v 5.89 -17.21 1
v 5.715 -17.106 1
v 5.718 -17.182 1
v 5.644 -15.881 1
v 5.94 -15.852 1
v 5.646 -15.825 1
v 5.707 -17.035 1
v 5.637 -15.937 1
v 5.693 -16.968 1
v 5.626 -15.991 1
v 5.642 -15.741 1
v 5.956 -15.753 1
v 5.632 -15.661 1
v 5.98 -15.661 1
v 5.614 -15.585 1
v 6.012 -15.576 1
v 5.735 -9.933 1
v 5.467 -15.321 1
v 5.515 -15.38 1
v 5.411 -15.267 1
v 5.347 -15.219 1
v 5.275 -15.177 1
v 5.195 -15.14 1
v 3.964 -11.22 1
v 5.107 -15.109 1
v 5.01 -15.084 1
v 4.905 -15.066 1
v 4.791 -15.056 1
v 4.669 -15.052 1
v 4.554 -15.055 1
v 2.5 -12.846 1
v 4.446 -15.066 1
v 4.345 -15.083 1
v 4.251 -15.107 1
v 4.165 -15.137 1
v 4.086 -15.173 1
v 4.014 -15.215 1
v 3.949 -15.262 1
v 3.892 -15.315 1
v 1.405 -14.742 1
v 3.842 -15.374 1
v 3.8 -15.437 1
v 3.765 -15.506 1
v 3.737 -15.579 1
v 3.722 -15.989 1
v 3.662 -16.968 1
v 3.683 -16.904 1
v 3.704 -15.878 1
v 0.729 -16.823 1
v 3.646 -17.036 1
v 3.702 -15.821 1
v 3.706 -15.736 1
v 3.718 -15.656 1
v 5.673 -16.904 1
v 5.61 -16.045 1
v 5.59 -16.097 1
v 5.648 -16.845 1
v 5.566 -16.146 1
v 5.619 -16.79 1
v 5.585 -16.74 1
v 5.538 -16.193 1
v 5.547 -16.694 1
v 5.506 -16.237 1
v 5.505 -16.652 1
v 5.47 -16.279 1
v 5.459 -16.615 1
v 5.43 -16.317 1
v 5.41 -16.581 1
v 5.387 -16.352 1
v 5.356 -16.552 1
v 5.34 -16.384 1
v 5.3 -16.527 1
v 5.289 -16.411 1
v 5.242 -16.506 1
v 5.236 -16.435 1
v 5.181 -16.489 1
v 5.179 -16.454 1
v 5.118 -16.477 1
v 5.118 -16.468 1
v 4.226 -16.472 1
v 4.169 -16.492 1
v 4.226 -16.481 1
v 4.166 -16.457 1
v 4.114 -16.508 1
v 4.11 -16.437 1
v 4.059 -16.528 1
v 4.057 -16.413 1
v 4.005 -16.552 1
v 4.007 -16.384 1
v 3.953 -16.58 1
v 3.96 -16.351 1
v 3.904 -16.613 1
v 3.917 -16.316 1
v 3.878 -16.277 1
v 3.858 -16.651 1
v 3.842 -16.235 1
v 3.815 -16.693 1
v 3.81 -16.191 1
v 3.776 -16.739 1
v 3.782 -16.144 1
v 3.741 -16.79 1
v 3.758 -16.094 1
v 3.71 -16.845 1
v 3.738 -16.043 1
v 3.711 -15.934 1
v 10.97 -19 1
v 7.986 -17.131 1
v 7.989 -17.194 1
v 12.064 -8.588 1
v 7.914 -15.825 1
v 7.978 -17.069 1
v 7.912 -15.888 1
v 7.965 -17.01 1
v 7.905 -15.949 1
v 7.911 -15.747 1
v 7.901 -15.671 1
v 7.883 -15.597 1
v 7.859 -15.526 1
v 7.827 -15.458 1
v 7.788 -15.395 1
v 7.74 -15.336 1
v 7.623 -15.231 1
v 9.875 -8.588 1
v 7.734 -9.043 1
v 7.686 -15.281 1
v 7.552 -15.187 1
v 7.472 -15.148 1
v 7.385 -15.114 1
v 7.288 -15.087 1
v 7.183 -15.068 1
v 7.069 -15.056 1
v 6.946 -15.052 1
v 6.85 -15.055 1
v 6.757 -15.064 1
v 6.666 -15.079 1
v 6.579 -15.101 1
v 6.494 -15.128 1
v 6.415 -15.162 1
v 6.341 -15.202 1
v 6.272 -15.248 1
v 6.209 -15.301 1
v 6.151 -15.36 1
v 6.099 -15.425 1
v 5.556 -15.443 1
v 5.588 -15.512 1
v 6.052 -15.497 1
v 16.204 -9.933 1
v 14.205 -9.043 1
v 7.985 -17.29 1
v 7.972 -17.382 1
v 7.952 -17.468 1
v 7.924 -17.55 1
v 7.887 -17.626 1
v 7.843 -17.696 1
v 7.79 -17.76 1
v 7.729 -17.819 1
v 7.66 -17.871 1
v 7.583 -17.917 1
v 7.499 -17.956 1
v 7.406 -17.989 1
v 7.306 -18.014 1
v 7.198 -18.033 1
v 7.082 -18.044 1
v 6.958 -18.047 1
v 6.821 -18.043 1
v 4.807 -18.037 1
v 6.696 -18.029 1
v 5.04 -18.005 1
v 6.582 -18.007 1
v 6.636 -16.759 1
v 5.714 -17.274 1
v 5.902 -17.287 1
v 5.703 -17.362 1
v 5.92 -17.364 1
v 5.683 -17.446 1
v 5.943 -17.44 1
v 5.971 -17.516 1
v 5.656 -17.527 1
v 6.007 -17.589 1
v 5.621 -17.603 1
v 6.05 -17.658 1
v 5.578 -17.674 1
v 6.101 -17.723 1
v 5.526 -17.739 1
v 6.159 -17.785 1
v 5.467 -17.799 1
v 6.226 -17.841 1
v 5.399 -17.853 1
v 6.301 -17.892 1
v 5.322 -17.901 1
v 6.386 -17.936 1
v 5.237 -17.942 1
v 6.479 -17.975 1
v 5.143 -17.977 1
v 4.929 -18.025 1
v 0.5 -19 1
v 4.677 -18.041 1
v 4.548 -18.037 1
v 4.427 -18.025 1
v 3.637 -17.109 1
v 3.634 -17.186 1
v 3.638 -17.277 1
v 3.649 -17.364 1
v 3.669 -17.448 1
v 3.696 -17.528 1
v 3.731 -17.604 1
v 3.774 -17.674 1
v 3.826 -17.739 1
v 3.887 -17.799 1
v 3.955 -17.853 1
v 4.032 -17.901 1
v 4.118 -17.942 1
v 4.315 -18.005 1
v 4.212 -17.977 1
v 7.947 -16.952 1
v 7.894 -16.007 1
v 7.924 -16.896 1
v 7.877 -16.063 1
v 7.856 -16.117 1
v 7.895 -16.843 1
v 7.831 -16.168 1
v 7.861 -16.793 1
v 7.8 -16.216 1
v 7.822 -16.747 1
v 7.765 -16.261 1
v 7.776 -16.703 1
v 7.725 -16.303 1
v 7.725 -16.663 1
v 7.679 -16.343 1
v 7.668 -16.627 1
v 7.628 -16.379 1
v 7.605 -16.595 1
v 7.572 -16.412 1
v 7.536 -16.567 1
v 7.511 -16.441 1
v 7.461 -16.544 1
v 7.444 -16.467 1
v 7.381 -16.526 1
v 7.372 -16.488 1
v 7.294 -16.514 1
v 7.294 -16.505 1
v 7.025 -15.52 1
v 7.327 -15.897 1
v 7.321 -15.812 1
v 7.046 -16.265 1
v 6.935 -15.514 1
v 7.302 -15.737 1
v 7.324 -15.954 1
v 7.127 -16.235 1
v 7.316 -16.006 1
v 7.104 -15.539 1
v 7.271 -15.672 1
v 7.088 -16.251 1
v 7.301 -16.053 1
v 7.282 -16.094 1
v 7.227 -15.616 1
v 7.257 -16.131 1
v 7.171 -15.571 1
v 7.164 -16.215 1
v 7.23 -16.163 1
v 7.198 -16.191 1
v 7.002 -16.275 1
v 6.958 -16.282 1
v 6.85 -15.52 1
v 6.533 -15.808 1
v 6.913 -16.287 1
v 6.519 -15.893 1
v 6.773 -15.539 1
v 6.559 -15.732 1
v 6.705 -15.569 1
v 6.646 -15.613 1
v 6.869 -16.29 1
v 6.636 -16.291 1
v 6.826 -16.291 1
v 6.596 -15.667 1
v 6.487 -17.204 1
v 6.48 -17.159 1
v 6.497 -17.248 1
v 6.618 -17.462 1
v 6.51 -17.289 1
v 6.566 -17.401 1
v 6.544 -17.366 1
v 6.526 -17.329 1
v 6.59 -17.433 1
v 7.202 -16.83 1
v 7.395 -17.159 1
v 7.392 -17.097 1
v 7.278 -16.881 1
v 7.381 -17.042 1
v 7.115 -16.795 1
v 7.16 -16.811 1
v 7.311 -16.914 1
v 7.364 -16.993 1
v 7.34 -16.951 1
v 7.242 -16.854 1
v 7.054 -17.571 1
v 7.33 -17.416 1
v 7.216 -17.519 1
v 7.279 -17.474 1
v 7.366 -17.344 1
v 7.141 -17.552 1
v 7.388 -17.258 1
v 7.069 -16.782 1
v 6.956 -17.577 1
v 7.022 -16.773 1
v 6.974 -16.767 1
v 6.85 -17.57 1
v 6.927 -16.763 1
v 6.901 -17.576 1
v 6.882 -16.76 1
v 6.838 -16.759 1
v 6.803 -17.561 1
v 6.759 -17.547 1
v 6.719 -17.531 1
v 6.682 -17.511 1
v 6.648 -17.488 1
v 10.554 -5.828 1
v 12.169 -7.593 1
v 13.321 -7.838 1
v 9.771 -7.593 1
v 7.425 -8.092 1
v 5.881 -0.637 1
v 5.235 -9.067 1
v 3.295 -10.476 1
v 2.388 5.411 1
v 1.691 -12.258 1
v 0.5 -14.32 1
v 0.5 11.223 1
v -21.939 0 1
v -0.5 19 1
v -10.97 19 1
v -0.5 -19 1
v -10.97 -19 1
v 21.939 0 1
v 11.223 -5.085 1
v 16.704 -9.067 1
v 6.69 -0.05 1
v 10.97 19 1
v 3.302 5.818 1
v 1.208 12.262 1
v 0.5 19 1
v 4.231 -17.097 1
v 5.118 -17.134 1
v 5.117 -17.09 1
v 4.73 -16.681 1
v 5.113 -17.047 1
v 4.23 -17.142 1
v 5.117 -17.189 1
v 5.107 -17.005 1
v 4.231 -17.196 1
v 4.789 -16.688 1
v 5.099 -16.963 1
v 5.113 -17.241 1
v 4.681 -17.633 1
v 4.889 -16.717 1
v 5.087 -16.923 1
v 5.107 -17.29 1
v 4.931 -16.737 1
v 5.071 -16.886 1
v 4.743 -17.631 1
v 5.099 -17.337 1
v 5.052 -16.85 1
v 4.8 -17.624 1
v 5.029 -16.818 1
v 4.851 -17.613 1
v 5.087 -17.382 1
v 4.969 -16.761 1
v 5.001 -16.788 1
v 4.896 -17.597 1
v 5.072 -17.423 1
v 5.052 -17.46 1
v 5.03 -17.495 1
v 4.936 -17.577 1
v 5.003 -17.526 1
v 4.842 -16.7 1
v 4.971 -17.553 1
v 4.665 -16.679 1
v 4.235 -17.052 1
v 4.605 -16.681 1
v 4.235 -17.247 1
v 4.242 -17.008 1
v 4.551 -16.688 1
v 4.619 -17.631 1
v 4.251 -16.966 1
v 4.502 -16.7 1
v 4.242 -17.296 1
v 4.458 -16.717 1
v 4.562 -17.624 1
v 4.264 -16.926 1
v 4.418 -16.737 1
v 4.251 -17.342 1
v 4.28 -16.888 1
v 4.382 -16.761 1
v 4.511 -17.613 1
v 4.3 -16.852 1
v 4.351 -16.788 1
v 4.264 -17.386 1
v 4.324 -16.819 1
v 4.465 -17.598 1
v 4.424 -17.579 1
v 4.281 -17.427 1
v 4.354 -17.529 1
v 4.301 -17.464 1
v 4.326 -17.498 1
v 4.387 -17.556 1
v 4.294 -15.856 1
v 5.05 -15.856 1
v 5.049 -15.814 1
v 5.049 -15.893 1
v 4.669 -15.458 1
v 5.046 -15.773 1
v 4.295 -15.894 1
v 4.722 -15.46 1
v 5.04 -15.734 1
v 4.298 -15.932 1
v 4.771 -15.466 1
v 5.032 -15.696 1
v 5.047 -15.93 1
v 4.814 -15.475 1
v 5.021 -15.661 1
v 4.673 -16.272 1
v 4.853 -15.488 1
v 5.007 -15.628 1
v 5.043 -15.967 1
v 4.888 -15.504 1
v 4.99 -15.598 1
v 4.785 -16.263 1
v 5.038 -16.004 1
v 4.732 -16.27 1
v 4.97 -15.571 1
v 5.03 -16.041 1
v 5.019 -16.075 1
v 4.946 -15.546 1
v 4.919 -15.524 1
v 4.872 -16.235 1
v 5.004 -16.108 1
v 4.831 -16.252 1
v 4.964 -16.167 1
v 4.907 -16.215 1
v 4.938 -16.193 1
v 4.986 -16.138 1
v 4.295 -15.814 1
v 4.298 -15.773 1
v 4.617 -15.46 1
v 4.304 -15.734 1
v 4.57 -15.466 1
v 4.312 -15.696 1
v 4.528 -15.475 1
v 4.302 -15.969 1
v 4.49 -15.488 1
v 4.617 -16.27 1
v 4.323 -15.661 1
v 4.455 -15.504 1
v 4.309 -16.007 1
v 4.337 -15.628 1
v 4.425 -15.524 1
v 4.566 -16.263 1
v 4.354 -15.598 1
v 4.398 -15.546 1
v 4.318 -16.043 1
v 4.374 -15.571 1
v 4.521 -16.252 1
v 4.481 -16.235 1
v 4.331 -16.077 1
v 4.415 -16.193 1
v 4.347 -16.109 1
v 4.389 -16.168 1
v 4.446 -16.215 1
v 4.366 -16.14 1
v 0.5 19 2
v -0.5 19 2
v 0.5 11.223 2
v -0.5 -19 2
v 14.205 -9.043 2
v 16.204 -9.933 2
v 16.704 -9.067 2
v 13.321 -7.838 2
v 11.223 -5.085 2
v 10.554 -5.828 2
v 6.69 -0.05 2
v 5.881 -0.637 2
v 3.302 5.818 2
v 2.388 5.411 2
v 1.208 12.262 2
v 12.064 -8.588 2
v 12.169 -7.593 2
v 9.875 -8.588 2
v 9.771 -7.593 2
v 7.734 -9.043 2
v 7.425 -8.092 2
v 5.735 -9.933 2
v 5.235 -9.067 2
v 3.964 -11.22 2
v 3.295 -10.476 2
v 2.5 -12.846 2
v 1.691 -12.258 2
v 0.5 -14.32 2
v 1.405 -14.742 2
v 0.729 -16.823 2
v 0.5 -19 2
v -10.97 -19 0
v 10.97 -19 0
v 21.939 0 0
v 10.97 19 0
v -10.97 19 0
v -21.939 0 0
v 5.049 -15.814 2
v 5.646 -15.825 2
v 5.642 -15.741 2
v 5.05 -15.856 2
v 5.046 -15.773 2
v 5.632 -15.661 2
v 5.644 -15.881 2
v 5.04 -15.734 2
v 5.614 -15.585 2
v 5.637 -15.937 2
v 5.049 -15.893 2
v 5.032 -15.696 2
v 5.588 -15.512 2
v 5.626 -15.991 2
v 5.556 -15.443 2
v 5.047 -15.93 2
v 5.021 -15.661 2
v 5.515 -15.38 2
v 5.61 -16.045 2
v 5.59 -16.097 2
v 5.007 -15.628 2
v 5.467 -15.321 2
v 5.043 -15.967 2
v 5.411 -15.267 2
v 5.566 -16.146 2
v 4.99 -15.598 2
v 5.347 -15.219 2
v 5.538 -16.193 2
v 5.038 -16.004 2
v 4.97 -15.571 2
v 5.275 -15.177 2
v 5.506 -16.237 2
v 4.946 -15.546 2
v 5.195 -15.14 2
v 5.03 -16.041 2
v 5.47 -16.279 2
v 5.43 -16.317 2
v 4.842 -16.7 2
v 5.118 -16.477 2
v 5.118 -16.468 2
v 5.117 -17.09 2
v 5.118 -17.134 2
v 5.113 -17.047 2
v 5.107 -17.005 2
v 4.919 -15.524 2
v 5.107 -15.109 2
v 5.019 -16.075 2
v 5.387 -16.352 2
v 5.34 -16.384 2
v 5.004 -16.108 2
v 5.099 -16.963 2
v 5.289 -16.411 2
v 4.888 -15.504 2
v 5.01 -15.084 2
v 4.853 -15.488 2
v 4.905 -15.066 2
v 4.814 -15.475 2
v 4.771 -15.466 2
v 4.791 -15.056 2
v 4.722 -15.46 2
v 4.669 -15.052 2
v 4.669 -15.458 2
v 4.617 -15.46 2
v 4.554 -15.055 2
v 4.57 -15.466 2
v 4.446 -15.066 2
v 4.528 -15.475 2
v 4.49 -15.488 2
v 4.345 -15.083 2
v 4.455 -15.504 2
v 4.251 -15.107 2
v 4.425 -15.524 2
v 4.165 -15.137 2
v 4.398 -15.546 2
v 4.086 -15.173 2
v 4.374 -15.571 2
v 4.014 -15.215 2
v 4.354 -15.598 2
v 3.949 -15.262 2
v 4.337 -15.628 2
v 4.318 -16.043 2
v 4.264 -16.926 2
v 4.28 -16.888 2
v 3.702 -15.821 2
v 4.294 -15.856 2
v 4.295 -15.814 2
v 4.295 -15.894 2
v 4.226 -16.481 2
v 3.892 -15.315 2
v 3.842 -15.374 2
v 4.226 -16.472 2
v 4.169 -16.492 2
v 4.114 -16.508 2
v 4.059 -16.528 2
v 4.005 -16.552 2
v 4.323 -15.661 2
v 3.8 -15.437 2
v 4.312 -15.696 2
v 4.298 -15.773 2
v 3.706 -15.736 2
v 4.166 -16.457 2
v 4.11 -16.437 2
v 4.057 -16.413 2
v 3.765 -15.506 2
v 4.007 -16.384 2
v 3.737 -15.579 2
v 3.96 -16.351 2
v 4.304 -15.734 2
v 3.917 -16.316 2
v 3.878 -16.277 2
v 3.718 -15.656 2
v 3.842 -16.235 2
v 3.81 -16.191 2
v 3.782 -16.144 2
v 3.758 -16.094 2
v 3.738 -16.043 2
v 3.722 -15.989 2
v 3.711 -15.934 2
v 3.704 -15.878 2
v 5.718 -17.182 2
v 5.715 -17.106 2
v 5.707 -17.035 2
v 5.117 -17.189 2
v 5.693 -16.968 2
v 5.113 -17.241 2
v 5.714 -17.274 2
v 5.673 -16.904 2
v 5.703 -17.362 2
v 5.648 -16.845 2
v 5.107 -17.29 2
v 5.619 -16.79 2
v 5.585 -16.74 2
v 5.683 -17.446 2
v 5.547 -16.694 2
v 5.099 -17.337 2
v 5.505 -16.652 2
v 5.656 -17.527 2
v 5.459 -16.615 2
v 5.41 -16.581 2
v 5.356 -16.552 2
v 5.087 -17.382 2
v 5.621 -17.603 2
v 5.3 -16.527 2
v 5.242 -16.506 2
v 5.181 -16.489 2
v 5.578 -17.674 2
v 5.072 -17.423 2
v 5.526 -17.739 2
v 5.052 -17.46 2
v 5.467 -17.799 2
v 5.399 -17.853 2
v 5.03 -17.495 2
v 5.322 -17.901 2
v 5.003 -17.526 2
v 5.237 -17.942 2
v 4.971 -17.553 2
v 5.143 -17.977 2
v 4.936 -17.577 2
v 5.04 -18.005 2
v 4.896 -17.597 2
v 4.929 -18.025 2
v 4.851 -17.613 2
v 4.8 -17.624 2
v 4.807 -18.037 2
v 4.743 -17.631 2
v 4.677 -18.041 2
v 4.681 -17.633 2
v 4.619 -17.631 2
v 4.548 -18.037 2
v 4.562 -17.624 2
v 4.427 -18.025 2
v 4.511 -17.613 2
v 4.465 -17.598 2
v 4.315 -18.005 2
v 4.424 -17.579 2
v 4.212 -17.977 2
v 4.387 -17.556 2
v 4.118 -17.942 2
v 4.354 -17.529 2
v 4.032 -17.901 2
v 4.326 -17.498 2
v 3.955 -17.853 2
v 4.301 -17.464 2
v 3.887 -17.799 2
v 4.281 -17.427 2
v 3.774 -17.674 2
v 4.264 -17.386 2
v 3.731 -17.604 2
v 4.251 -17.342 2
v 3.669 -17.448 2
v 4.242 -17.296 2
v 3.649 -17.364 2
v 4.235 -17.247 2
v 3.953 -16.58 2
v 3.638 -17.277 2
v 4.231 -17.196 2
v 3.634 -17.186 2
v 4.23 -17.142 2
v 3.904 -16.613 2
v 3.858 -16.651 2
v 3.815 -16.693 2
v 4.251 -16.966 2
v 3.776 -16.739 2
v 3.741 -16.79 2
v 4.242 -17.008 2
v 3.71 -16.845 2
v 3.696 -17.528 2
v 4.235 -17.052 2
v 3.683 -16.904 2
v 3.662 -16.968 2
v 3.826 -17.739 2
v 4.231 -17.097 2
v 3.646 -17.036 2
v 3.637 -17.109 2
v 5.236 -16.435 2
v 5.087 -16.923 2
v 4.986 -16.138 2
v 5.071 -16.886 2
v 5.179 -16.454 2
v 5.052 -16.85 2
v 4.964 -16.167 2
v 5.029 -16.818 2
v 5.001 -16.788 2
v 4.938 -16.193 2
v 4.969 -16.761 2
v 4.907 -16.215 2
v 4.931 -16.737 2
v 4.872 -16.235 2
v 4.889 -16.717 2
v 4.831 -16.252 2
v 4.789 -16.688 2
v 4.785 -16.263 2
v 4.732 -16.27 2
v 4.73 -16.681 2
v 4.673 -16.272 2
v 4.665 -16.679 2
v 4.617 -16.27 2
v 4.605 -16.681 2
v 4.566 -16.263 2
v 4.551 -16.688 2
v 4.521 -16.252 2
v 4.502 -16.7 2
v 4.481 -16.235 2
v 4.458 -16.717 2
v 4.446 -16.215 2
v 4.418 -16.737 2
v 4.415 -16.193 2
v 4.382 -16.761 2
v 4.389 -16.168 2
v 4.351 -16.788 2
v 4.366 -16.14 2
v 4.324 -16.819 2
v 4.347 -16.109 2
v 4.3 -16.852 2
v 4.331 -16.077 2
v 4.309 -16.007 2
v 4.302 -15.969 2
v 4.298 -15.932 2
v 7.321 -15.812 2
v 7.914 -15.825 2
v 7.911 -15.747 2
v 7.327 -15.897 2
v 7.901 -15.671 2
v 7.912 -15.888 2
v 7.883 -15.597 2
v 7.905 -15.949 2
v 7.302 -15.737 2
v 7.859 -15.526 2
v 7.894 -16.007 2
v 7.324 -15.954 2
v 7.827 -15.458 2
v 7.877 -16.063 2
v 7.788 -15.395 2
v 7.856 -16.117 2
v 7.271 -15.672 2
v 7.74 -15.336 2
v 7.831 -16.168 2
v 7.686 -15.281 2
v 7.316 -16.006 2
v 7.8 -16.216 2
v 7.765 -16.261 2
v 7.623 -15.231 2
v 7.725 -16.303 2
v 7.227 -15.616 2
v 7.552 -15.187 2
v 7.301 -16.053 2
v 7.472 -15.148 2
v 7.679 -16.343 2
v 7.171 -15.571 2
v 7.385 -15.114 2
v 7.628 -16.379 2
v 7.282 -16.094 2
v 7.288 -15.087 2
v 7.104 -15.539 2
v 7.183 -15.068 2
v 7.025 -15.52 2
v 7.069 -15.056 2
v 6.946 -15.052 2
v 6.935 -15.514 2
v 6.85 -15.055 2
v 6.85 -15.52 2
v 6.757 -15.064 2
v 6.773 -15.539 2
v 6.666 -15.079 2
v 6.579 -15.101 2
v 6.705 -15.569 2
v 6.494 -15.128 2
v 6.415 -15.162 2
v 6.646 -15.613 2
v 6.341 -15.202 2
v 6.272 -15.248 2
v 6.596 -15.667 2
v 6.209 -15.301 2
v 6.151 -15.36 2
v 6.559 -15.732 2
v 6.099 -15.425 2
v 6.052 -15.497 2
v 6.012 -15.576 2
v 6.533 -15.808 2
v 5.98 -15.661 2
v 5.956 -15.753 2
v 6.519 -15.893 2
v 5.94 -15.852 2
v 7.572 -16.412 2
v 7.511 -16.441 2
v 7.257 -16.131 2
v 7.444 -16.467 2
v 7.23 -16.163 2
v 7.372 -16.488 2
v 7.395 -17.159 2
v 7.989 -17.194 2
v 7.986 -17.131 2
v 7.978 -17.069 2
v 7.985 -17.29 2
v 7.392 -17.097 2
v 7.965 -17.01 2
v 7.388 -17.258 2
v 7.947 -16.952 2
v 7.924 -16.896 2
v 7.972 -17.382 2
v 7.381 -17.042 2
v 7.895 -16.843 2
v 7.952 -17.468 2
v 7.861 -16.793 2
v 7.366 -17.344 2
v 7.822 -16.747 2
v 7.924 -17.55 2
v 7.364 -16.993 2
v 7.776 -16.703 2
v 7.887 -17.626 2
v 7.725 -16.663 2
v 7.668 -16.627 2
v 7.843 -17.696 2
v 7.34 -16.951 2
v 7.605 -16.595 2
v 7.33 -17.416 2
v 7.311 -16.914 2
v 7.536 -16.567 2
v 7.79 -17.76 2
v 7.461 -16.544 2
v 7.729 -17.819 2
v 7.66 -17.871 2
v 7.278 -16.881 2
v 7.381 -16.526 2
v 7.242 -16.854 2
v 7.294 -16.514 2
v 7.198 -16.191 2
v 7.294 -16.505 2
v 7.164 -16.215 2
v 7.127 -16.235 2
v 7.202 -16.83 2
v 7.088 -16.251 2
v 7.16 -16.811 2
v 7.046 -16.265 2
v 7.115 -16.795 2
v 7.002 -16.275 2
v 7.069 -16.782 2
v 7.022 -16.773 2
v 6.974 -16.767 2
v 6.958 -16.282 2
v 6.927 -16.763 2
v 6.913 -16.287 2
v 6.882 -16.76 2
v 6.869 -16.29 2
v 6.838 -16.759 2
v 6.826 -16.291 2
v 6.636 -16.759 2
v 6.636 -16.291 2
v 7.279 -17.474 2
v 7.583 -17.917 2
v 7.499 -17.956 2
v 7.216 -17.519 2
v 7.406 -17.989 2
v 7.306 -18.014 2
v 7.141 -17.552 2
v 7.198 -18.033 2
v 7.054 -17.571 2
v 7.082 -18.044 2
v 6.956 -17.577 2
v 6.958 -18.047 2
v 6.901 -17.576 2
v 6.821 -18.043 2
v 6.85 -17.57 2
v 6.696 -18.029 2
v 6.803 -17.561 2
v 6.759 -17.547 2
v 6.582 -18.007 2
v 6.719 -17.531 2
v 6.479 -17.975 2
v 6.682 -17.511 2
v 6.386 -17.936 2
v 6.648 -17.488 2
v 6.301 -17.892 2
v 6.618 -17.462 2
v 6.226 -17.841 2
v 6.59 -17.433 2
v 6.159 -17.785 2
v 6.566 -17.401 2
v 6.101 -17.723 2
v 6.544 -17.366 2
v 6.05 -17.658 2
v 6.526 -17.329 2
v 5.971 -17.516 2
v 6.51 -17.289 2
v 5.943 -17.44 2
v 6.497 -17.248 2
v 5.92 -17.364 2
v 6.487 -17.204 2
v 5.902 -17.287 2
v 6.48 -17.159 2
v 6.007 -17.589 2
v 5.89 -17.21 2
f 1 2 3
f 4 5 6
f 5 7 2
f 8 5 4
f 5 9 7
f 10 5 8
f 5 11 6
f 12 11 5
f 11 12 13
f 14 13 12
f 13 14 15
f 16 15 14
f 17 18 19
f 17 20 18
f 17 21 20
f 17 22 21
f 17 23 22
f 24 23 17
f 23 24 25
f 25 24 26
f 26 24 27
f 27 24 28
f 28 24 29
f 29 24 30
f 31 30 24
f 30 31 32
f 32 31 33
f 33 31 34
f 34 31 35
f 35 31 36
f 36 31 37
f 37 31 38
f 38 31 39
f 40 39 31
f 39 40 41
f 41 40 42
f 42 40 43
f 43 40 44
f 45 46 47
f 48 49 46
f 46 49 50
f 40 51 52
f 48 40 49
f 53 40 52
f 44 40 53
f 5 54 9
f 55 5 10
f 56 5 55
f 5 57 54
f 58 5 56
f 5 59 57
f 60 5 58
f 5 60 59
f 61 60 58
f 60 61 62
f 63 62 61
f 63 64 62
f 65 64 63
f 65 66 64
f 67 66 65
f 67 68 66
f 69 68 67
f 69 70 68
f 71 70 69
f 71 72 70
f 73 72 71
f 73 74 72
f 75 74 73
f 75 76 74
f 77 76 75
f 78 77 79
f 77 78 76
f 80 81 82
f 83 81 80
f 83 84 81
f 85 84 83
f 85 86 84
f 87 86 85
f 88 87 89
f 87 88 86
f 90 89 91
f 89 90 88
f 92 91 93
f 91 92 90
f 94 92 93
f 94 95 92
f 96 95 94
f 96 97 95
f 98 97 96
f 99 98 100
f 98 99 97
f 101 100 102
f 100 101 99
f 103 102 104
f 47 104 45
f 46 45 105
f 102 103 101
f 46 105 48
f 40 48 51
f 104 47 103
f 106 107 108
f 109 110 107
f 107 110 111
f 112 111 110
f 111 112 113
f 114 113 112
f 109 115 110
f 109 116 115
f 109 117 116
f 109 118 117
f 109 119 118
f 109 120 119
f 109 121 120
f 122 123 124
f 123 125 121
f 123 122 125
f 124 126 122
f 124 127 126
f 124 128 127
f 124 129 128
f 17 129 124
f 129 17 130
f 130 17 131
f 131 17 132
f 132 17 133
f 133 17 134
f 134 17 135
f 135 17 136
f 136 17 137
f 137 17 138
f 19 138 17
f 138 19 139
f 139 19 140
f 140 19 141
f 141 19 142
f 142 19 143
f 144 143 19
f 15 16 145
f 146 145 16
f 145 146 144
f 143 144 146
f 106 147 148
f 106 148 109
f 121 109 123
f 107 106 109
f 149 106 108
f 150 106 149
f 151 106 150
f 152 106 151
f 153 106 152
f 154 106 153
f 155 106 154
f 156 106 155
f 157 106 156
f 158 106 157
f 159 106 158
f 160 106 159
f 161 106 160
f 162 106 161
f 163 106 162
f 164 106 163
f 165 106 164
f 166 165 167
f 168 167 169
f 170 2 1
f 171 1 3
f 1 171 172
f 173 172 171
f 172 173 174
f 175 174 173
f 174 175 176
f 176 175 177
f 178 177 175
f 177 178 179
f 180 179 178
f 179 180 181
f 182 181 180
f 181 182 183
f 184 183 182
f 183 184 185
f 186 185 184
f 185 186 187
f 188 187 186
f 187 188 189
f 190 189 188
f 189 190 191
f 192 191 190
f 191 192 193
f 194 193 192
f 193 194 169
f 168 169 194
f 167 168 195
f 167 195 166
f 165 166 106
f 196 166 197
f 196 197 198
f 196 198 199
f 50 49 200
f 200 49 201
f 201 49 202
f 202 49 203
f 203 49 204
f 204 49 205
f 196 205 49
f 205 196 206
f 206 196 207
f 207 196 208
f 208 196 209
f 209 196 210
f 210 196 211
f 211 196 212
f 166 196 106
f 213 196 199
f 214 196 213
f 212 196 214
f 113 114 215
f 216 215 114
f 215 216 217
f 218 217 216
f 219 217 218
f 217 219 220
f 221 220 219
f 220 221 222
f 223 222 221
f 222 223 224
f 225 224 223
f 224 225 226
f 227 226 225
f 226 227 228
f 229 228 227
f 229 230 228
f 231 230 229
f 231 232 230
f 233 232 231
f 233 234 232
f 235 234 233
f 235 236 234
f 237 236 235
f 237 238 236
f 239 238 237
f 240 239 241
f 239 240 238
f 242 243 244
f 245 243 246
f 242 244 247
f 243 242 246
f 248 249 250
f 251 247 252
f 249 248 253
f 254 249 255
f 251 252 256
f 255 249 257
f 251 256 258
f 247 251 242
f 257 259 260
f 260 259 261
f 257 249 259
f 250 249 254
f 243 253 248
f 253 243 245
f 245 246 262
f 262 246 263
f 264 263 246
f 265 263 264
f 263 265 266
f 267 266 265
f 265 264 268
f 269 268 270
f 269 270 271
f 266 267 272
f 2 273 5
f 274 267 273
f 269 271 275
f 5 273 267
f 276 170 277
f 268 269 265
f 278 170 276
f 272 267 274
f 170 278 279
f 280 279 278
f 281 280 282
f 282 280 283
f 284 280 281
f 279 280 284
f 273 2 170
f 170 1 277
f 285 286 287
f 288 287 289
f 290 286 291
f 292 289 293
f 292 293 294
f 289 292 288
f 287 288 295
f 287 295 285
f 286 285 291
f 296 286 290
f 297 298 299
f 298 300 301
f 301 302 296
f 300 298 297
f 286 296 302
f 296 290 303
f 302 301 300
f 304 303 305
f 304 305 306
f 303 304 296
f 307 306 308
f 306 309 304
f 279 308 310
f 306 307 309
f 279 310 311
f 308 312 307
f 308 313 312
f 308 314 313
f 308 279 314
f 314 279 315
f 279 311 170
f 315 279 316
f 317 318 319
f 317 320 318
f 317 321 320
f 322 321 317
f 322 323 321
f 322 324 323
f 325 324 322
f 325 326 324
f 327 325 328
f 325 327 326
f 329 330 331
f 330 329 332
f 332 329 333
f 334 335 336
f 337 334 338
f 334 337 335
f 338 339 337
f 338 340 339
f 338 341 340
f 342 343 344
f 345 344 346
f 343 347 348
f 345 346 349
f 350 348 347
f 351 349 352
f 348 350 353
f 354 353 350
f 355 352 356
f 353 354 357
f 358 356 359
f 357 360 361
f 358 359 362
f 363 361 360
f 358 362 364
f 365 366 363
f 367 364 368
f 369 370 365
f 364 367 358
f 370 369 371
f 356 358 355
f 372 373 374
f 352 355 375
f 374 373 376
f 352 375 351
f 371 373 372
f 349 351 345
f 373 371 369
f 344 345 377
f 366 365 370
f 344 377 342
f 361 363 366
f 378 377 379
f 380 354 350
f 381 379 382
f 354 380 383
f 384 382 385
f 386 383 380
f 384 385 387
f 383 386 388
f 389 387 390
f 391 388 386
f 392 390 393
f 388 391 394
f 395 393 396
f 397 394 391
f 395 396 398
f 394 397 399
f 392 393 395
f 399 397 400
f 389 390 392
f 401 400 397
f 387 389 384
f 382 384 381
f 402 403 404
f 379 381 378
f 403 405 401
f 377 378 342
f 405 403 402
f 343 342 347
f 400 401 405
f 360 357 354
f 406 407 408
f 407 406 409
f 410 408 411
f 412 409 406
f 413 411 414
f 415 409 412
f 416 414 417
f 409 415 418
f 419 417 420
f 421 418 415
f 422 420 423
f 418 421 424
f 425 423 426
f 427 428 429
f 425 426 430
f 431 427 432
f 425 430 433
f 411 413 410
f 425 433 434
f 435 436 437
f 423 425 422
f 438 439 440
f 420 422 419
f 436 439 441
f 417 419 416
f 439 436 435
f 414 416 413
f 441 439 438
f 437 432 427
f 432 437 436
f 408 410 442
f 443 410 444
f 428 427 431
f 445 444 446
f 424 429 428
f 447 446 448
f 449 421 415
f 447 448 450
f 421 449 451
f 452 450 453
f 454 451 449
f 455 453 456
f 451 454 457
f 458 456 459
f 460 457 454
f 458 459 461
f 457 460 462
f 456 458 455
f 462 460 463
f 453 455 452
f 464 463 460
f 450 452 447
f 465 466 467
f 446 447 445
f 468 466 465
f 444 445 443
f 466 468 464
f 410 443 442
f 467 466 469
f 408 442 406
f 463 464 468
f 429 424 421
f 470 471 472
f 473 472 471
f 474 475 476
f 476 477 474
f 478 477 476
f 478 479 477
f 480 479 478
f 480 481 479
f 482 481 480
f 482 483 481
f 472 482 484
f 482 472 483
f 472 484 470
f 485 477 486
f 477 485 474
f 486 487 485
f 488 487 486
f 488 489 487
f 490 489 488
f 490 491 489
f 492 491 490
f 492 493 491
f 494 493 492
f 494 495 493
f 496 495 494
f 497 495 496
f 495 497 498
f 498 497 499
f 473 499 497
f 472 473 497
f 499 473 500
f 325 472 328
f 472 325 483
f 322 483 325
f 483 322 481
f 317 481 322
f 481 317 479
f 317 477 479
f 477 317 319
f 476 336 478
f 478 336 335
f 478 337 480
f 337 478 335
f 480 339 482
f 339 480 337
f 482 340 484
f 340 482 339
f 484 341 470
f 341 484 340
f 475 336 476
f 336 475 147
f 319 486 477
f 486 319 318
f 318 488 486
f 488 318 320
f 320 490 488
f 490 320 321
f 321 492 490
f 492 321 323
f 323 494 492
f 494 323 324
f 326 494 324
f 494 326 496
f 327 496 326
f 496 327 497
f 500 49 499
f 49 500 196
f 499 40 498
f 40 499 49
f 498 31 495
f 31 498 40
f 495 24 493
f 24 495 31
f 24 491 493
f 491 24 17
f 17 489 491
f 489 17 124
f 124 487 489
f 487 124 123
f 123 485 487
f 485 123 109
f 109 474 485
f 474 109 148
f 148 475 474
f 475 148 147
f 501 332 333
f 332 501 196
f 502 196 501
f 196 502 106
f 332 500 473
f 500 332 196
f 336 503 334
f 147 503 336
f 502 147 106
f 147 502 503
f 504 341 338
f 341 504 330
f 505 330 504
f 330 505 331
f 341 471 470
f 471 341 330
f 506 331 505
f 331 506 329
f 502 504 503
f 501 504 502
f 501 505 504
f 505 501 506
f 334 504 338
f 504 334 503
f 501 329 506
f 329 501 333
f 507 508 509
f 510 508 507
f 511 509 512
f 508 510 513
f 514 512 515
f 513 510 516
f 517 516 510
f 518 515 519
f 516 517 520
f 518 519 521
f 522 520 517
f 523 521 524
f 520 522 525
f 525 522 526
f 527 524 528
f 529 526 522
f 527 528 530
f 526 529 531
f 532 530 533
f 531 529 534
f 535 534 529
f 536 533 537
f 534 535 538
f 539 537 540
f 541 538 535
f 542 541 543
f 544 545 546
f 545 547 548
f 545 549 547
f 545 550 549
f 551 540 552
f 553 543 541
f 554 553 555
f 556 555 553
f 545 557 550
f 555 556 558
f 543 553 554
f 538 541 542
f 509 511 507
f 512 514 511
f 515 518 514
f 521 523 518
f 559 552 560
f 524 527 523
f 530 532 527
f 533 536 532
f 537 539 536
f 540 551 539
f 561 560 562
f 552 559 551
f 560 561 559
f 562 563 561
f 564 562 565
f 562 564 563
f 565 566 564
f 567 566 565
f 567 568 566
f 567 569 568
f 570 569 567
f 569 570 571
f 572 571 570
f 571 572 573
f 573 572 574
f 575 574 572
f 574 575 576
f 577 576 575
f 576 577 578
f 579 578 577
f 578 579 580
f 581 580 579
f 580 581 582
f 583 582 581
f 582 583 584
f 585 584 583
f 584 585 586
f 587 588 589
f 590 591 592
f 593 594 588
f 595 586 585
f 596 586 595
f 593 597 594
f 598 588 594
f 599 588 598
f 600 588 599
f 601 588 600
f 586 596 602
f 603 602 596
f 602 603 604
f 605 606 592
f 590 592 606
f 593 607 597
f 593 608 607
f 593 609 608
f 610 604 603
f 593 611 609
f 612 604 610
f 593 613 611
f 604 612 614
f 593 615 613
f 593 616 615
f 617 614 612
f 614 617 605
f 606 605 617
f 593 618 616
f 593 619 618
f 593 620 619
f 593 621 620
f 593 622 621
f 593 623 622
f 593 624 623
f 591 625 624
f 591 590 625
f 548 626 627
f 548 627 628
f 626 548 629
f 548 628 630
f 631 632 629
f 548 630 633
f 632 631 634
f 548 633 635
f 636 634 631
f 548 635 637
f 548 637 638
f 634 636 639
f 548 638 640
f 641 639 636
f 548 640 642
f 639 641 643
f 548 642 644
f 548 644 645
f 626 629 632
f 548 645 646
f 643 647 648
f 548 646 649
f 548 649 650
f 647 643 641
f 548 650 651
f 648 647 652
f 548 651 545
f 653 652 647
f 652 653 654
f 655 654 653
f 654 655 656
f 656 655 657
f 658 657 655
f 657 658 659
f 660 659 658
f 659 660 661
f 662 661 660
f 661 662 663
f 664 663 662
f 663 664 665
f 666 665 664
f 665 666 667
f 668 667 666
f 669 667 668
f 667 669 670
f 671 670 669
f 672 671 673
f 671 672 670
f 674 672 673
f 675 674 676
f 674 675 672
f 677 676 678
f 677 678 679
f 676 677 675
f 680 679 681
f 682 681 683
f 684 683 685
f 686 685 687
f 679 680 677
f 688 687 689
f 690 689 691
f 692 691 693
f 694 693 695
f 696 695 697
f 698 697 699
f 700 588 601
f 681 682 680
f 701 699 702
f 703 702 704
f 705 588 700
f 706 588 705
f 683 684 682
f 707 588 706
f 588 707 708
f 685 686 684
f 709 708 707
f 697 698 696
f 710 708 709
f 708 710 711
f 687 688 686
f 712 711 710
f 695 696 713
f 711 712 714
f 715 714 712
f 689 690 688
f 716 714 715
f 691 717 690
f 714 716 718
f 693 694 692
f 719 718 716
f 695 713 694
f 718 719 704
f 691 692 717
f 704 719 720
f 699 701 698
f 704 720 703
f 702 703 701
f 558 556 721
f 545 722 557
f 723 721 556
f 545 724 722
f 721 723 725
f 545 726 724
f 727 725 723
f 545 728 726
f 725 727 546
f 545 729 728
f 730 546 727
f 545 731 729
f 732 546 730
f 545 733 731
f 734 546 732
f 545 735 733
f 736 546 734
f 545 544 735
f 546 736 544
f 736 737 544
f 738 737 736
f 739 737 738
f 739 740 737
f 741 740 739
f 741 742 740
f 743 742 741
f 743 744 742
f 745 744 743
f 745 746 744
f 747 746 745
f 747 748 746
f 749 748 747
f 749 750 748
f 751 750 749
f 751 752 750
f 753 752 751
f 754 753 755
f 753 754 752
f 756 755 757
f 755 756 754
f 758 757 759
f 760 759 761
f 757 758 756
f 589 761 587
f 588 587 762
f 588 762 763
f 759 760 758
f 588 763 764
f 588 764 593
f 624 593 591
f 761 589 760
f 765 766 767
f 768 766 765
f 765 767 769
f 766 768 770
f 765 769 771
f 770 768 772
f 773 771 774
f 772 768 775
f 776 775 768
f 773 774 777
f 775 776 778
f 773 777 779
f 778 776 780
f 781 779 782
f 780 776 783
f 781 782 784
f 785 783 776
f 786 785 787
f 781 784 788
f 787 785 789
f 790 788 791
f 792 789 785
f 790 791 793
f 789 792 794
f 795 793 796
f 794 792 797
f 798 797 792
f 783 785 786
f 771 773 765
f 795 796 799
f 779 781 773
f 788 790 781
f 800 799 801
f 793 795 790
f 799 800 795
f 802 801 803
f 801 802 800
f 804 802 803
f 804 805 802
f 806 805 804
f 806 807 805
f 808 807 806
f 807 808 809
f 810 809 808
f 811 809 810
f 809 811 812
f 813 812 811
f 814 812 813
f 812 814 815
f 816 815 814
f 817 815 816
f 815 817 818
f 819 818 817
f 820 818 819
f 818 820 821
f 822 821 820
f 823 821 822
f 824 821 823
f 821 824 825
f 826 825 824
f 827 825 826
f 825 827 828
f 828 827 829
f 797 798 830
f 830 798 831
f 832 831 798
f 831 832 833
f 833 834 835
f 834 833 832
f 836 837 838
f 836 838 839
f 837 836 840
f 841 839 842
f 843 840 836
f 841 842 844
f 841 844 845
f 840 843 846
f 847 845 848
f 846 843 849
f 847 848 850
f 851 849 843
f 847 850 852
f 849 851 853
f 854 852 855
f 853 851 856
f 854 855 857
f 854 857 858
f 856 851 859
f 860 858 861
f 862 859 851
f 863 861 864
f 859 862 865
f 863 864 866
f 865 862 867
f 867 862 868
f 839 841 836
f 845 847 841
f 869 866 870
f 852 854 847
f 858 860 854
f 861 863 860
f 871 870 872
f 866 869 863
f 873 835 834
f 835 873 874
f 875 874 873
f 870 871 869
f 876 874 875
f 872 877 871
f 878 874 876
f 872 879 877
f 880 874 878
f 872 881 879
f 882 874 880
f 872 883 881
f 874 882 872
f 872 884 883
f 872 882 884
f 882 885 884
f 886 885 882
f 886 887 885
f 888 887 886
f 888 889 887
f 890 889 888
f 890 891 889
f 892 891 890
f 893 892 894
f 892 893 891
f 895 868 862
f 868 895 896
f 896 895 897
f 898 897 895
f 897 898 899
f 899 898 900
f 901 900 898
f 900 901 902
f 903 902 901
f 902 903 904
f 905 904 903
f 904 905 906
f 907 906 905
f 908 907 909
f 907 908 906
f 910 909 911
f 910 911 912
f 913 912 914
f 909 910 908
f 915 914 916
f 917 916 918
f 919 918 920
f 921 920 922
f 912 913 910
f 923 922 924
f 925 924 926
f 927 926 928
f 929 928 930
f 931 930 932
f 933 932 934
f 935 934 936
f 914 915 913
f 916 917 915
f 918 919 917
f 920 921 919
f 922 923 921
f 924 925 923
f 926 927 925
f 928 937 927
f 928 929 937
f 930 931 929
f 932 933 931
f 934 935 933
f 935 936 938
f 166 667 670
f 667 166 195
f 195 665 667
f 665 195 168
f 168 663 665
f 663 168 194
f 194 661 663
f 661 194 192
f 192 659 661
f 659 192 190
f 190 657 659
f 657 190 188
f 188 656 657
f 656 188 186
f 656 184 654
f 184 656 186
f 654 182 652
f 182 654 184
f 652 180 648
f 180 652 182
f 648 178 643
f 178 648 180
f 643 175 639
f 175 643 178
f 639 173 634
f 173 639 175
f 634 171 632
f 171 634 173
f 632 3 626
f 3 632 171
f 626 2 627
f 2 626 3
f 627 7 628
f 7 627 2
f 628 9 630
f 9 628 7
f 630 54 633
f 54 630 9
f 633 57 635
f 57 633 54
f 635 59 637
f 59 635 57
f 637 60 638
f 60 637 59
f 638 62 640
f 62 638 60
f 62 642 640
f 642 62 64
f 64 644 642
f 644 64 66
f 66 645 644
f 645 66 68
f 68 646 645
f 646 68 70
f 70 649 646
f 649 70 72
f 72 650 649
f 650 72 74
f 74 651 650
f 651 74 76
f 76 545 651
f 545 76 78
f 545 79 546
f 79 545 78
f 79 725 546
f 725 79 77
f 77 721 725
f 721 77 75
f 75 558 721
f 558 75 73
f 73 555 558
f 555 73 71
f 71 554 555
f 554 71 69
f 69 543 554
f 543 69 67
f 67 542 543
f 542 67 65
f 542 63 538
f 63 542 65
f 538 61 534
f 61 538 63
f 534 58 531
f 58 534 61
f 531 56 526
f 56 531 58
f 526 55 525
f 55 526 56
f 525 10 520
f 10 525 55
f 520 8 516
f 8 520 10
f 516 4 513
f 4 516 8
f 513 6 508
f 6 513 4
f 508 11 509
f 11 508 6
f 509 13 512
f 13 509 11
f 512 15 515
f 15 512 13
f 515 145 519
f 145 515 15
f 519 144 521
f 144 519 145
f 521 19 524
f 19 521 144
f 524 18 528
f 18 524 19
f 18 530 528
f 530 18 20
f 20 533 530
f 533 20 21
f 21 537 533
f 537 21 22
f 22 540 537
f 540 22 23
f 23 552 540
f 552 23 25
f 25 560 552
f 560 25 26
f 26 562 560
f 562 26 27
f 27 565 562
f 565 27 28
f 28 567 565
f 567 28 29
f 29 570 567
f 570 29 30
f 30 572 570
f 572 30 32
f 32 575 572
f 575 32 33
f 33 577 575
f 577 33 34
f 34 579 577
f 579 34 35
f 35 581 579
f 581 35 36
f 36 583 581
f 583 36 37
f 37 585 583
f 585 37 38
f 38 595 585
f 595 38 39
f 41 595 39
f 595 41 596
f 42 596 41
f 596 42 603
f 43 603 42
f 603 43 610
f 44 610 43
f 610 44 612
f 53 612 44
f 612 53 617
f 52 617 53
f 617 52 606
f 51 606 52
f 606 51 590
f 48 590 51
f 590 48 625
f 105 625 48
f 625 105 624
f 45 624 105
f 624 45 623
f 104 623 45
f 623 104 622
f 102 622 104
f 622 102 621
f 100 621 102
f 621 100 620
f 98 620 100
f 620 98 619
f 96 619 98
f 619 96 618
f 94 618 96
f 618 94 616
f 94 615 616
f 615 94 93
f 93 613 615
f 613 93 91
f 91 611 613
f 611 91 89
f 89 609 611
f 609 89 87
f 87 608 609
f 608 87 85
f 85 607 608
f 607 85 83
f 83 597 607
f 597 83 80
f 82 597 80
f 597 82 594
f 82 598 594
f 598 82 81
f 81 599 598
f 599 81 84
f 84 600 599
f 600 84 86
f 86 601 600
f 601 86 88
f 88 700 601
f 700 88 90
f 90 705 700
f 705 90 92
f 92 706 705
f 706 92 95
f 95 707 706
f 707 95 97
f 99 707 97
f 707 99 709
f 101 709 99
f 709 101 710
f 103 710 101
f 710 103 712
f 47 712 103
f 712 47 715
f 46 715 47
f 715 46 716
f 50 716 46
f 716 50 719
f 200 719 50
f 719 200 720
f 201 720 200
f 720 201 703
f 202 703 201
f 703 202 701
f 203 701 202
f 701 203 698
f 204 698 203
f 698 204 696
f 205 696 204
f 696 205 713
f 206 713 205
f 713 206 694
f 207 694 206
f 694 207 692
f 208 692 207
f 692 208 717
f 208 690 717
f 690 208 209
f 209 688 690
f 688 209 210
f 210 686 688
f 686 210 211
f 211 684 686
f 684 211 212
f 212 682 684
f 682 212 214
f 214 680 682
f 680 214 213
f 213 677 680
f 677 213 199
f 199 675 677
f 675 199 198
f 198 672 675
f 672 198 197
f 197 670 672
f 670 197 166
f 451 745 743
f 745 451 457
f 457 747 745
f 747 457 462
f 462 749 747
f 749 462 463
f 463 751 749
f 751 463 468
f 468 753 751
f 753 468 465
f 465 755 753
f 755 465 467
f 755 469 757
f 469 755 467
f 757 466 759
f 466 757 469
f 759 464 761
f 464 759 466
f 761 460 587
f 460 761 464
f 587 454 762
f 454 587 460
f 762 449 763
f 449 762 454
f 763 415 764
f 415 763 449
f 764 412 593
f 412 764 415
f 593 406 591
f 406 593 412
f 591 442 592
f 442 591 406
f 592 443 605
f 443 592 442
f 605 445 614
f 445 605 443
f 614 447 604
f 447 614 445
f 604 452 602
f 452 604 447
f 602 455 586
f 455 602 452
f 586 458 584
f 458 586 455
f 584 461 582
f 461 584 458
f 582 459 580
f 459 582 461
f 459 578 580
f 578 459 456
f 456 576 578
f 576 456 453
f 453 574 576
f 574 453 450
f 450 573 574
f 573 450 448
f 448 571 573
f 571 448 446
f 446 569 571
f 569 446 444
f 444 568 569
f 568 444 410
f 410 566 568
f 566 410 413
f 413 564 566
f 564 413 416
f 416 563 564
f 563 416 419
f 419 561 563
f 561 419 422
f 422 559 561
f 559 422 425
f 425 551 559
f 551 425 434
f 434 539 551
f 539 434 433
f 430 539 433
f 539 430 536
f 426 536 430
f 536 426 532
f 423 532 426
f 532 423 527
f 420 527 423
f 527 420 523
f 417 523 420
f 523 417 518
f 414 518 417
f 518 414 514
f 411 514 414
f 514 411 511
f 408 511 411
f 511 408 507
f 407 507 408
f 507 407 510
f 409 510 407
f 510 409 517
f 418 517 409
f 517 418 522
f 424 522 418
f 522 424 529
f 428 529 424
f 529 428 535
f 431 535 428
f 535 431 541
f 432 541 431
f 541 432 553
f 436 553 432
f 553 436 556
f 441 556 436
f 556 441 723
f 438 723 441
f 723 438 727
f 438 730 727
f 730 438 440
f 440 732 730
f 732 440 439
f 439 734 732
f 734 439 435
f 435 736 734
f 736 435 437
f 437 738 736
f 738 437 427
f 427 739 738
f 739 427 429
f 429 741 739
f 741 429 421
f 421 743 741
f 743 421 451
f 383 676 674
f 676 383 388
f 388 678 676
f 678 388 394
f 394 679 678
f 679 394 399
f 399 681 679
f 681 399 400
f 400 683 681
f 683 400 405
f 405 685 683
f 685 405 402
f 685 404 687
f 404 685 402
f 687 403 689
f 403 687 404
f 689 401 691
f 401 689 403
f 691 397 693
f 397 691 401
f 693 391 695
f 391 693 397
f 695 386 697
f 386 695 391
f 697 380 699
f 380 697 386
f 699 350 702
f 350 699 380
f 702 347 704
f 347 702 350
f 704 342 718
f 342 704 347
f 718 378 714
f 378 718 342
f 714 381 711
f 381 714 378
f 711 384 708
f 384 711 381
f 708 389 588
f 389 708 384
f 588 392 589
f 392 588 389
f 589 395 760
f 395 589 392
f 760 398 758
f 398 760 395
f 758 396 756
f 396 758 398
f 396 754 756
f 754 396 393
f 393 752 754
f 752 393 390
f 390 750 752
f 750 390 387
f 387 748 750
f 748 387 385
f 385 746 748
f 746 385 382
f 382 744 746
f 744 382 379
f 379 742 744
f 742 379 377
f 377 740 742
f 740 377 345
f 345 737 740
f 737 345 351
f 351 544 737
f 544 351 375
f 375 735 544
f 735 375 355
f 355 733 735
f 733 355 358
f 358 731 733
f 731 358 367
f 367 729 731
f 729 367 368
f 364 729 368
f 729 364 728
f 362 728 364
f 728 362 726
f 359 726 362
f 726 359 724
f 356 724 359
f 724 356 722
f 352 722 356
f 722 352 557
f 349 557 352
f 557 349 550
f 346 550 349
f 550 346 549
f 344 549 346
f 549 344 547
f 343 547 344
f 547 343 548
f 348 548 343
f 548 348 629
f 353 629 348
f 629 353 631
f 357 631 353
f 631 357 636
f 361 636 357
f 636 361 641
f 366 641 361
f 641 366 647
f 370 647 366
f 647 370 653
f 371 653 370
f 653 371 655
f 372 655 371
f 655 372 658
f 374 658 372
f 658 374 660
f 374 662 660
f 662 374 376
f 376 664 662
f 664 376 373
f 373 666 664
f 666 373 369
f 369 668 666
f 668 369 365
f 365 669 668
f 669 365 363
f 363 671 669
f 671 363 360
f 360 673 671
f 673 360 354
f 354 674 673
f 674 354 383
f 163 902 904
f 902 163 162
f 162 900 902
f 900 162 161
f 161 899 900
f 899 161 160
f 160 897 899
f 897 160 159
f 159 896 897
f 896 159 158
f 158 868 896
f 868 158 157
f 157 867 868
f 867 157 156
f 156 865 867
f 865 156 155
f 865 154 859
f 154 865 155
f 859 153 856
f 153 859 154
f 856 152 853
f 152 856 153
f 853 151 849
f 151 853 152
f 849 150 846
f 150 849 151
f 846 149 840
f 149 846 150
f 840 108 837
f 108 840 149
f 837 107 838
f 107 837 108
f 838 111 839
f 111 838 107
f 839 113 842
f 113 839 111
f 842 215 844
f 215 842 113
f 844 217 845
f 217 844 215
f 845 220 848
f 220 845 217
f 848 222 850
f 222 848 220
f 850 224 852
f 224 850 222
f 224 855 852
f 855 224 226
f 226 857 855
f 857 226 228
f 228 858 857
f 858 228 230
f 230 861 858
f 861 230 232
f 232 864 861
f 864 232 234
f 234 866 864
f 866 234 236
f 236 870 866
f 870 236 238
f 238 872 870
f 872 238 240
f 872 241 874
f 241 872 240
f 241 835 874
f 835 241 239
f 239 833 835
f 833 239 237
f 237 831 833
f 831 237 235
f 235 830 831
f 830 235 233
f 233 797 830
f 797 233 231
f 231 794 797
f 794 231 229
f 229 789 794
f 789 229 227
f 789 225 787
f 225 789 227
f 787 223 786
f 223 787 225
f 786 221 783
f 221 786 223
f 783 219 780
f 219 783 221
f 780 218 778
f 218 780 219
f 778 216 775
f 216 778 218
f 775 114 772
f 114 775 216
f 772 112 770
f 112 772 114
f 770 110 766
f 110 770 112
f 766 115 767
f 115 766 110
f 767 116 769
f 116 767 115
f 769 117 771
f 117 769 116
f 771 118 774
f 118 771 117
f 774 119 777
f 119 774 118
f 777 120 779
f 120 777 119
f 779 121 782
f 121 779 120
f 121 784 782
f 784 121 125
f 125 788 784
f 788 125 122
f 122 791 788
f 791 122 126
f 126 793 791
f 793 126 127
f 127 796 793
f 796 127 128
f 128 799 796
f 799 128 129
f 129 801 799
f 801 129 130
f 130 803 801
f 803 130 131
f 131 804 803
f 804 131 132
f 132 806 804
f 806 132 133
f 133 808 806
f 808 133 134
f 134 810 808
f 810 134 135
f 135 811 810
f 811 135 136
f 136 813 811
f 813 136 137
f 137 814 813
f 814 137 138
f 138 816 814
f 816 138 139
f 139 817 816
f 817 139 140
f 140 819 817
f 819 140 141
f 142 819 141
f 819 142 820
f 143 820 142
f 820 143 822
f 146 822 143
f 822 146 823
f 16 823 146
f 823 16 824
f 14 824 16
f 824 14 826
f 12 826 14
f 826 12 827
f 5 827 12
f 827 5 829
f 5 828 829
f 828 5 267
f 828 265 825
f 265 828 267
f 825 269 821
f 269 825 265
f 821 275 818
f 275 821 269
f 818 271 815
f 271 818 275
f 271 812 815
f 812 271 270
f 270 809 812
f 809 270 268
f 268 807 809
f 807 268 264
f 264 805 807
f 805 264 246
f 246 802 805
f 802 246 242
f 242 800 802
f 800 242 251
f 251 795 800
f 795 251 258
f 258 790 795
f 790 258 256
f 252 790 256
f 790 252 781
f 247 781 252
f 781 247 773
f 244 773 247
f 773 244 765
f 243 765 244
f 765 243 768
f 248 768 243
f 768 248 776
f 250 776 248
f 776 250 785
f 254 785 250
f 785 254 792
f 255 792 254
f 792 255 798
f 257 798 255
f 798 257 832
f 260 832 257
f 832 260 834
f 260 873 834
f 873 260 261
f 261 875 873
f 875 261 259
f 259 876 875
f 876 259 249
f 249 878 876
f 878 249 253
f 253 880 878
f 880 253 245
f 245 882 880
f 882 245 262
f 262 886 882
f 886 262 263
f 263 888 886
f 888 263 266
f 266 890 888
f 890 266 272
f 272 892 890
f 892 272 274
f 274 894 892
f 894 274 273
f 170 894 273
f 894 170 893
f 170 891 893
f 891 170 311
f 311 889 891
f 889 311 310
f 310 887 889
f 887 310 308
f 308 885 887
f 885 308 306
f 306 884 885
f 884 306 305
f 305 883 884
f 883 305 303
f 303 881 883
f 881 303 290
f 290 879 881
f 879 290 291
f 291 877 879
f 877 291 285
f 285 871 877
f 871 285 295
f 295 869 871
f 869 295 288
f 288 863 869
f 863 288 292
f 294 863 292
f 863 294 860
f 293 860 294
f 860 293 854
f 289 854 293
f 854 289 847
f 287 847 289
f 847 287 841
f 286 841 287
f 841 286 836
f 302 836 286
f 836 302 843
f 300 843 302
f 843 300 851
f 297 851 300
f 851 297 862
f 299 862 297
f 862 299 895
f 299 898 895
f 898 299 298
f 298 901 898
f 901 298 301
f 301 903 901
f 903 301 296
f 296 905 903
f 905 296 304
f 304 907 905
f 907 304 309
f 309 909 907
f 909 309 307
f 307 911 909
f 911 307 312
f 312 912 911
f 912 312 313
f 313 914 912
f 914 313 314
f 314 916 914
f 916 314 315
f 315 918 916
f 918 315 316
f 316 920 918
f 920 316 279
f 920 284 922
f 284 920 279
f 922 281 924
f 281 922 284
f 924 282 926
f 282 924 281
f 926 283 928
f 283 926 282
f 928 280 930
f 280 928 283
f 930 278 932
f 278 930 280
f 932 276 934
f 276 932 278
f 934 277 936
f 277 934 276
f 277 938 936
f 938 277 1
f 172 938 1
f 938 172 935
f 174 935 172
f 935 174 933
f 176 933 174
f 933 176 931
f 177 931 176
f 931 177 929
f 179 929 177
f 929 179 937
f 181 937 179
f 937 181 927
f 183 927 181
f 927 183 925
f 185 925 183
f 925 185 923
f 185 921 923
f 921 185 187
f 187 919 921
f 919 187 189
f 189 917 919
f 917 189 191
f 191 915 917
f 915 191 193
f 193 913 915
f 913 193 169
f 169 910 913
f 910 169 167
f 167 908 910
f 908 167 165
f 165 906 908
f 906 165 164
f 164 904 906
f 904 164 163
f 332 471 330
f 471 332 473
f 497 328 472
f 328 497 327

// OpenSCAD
include <../Scripts/18xx tiles basic functions.scad>
hex("green");
put_tilenr("83");
light_curve(r=1);
sharp_curve(r=0);
straight_line(r=3);
